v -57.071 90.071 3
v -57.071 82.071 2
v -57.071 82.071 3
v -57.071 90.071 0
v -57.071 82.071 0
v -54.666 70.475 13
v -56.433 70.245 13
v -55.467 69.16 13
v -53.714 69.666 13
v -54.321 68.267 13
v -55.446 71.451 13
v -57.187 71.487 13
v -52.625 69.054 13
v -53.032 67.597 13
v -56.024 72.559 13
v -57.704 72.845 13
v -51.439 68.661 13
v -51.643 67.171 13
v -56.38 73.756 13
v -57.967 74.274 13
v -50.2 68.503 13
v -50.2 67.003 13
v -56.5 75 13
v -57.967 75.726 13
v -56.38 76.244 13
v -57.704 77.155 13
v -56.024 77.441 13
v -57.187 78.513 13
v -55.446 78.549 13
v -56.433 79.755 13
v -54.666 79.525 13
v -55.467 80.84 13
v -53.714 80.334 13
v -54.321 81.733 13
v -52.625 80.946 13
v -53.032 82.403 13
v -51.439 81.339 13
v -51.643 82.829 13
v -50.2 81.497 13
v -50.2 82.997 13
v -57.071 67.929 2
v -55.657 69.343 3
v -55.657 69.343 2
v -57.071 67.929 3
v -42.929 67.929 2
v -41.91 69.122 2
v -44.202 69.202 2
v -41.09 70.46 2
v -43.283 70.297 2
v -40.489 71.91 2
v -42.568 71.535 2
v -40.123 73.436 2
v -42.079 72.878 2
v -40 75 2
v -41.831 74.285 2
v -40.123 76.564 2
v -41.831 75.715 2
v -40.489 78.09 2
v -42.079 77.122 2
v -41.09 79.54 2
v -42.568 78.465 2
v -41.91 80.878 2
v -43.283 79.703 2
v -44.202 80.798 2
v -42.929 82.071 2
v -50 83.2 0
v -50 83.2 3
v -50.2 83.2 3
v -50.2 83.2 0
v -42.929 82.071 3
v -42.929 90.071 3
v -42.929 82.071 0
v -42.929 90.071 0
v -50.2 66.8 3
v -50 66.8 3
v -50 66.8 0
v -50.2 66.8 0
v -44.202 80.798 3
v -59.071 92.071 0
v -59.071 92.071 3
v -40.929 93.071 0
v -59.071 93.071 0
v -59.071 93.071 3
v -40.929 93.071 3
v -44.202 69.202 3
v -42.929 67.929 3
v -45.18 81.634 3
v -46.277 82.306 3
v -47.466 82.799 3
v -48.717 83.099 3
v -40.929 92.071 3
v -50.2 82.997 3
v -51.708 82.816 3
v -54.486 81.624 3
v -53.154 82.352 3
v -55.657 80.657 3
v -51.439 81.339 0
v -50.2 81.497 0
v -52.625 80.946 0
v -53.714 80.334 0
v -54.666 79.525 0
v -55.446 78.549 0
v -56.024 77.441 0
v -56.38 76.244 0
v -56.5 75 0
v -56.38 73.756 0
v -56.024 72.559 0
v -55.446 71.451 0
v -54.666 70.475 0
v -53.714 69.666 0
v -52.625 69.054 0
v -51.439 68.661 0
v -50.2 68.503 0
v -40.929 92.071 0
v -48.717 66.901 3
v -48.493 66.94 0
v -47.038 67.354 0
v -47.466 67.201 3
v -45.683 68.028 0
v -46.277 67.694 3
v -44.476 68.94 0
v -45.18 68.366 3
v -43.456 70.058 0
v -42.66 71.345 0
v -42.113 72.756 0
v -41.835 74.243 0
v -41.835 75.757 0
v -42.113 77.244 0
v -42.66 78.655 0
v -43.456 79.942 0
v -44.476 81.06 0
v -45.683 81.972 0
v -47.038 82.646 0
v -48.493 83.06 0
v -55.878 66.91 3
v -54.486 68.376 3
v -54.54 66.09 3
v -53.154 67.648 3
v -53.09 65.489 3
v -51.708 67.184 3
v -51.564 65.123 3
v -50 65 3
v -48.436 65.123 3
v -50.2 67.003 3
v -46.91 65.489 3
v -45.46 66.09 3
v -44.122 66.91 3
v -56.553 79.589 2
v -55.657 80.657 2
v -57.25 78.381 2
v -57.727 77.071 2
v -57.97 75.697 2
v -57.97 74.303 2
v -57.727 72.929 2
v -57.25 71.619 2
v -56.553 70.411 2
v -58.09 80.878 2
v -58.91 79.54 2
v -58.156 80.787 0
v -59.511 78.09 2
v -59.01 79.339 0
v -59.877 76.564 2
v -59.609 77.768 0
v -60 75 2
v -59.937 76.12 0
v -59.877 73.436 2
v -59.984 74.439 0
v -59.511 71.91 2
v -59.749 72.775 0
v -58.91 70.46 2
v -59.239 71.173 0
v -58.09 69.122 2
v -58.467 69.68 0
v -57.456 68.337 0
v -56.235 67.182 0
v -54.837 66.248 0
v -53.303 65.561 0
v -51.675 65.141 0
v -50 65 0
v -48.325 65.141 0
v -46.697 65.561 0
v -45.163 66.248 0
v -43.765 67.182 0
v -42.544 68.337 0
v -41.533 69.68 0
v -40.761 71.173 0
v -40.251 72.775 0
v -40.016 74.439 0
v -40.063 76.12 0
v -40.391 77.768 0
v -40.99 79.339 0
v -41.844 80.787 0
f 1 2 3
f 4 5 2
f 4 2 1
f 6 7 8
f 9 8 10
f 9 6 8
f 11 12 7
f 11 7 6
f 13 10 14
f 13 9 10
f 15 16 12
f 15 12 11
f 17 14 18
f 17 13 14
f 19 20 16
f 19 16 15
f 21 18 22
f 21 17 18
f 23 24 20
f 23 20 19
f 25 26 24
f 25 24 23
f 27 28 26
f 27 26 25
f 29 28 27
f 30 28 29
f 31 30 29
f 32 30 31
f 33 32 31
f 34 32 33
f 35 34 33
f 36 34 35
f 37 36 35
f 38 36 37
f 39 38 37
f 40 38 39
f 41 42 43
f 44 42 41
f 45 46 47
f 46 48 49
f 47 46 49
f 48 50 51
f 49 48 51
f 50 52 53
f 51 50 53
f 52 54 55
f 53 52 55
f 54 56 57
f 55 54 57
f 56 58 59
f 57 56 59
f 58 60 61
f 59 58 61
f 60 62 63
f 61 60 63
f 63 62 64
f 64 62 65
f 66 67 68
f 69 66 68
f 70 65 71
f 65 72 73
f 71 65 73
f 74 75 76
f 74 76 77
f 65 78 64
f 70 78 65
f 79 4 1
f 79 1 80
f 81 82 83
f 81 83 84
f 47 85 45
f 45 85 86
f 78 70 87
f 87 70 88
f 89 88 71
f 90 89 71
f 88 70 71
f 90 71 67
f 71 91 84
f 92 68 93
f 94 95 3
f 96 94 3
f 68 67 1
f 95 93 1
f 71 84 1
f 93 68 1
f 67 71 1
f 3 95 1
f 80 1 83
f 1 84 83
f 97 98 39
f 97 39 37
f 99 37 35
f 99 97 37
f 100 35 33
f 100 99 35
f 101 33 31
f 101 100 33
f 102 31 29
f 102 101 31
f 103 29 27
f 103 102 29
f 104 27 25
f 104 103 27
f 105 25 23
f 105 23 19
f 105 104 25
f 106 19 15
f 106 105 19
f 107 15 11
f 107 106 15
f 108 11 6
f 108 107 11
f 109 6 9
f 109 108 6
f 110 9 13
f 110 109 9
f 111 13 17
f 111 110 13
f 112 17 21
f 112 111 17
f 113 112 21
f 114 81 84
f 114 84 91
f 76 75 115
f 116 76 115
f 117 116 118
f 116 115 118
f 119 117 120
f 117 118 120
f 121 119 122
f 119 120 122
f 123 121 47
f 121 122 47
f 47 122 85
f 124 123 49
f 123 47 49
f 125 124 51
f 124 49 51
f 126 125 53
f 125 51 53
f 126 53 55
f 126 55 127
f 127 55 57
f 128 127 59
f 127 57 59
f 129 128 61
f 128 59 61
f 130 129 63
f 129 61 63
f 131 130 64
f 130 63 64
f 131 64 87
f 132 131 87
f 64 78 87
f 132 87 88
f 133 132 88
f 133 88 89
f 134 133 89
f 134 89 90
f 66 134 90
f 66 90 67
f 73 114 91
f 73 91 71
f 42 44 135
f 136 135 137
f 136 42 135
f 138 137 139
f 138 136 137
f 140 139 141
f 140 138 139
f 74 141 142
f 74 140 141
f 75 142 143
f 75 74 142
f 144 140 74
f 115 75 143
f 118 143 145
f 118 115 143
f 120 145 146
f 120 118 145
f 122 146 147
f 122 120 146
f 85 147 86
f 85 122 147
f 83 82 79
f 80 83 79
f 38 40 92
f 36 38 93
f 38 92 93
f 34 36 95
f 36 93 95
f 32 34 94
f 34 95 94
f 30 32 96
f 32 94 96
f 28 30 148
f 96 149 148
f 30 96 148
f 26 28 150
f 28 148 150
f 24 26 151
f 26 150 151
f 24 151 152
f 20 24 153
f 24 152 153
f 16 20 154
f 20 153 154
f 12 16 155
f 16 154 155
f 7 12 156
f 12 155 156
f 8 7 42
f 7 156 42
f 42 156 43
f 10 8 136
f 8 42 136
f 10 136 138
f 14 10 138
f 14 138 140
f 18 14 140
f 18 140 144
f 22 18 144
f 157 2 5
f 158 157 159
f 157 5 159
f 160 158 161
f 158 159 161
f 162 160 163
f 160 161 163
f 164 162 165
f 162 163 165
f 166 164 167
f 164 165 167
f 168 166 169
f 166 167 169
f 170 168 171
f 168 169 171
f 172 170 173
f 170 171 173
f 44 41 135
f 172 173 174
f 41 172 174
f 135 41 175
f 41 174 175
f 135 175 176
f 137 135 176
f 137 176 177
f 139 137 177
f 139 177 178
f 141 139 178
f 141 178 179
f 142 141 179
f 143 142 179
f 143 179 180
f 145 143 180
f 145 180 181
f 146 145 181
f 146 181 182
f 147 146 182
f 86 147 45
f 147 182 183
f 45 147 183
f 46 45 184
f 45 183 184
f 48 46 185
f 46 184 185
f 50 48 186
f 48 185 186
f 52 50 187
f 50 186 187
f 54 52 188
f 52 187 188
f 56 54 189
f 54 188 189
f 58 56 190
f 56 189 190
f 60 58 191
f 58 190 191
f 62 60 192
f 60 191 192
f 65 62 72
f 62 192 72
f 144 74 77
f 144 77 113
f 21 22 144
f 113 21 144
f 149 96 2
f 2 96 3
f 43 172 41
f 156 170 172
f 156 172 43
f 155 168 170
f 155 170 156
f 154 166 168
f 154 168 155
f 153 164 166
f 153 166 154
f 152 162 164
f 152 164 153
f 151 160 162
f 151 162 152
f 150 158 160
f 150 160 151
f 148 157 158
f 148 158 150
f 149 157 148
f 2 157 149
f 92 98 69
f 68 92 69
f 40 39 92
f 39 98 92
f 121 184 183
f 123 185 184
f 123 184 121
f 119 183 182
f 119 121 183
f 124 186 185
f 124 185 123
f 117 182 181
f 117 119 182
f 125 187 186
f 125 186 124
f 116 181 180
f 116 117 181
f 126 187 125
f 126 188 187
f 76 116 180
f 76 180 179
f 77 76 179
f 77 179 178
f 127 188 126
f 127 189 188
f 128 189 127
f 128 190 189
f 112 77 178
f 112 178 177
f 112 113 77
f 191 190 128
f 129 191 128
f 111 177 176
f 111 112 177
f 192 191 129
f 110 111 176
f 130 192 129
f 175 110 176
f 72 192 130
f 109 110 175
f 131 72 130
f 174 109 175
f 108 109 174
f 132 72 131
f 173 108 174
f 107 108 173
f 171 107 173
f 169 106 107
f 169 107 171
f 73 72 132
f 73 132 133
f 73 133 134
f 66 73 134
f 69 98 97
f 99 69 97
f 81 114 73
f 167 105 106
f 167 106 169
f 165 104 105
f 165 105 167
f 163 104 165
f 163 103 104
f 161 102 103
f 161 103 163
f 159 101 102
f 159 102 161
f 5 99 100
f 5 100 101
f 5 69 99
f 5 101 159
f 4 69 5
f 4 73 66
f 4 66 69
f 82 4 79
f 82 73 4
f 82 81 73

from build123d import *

# Parameters (mm, degrees)
SKETCH020_R     = 10
PAD007_DEPTH    = 3
POCKET012_DEPTH = 1
SKETCH022_R     = 8
POCKET013_DEPTH = 5
PAD008_DEPTH    = 13
POCKET014_DEPTH = 20
PAD009_DEPTH    = 3


with BuildPart() as part:
    # Sketch020 → Pad007 (new body)
    with BuildSketch(Plane.XY):
        Circle(SKETCH020_R)
    extrude(amount=PAD007_DEPTH)

    # Sketch021 (on Face3 of Pad007) → Pocket012 (cut)
    with BuildSketch(Plane.XY.offset(3)):
        with BuildLine():
            Line((0, 0), (7.071068, 7.071068))
            ThreePointArc((7.071068, -7.071068), (10, 0), (7.071068, 7.071068))
            Line((0, 0), (7.071068, -7.071068))
        make_face()
        with BuildLine():
            ThreePointArc((-7.071068, 7.071068), (-10, 0), (-7.071068, -7.071068))
            Line((0, 0), (-7.071068, -7.071068))
            Line((0, 0), (-7.071068, 7.071068))
        make_face()
    extrude(amount=-POCKET012_DEPTH, mode=Mode.SUBTRACT)

    # Sketch022 (on Face9 of Pocket012) → Pocket013 (cut)
    with BuildSketch(Plane.XY.offset(3)):
        Circle(SKETCH022_R)
    extrude(amount=-POCKET013_DEPTH, mode=Mode.SUBTRACT)

    # Sketch023 → Pad008 (join)
    with BuildSketch(Plane.XY):
        with BuildLine():
            Line((0, 6.5), (0, 8))
            ThreePointArc((0, 8), (-8, 0), (0, -8))
            Line((0, -6.5), (0, -8))
            ThreePointArc((0, 6.5), (-6.5, 0), (0, -6.5))
        make_face()
    extrude(amount=PAD008_DEPTH)

    # Sketch024 (on Face14 of Pad008) → Pocket014 (cut)
    with BuildSketch(Plane.XY.offset(13)):
        with BuildLine():
            ThreePointArc((0, -8.2), (8.2, 0), (0, 8.2))
            Line((0, 8.2), (-0.2, 8.2))
            Line((-0.2, -8.2), (-0.2, 8.2))
            Line((0, -8.2), (-0.2, -8.2))
        make_face()
    extrude(amount=-POCKET014_DEPTH, mode=Mode.SUBTRACT)

    # Sketch025 → Pad009 (join)
    with BuildSketch(Plane.XY):
        with BuildLine():
            Line((-7.071068, 7.071068), (-7.071068, 15.071068))
            Line((-7.071068, 15.071068), (-9.071068, 17.071068))
            Line((-9.071068, 18.071068), (-9.071068, 17.071068))
            Line((-9.071068, 18.071068), (9.071068, 18.071068))
            Line((9.071068, 18.071068), (9.071068, 17.071068))
            Line((9.071068, 17.071068), (7.071068, 15.071068))
            Line((7.071068, 7.071068), (7.071068, 15.071068))
            ThreePointArc((7.071068, 7.071068), (0, 10), (-7.071068, 7.071068))
        make_face()
    extrude(amount=PAD009_DEPTH)


with BuildPart() as part_1:
    # Body007 placement: moved
    add(part.part.moved(Location((-50, 75, 0))))


solid = part_1.part
